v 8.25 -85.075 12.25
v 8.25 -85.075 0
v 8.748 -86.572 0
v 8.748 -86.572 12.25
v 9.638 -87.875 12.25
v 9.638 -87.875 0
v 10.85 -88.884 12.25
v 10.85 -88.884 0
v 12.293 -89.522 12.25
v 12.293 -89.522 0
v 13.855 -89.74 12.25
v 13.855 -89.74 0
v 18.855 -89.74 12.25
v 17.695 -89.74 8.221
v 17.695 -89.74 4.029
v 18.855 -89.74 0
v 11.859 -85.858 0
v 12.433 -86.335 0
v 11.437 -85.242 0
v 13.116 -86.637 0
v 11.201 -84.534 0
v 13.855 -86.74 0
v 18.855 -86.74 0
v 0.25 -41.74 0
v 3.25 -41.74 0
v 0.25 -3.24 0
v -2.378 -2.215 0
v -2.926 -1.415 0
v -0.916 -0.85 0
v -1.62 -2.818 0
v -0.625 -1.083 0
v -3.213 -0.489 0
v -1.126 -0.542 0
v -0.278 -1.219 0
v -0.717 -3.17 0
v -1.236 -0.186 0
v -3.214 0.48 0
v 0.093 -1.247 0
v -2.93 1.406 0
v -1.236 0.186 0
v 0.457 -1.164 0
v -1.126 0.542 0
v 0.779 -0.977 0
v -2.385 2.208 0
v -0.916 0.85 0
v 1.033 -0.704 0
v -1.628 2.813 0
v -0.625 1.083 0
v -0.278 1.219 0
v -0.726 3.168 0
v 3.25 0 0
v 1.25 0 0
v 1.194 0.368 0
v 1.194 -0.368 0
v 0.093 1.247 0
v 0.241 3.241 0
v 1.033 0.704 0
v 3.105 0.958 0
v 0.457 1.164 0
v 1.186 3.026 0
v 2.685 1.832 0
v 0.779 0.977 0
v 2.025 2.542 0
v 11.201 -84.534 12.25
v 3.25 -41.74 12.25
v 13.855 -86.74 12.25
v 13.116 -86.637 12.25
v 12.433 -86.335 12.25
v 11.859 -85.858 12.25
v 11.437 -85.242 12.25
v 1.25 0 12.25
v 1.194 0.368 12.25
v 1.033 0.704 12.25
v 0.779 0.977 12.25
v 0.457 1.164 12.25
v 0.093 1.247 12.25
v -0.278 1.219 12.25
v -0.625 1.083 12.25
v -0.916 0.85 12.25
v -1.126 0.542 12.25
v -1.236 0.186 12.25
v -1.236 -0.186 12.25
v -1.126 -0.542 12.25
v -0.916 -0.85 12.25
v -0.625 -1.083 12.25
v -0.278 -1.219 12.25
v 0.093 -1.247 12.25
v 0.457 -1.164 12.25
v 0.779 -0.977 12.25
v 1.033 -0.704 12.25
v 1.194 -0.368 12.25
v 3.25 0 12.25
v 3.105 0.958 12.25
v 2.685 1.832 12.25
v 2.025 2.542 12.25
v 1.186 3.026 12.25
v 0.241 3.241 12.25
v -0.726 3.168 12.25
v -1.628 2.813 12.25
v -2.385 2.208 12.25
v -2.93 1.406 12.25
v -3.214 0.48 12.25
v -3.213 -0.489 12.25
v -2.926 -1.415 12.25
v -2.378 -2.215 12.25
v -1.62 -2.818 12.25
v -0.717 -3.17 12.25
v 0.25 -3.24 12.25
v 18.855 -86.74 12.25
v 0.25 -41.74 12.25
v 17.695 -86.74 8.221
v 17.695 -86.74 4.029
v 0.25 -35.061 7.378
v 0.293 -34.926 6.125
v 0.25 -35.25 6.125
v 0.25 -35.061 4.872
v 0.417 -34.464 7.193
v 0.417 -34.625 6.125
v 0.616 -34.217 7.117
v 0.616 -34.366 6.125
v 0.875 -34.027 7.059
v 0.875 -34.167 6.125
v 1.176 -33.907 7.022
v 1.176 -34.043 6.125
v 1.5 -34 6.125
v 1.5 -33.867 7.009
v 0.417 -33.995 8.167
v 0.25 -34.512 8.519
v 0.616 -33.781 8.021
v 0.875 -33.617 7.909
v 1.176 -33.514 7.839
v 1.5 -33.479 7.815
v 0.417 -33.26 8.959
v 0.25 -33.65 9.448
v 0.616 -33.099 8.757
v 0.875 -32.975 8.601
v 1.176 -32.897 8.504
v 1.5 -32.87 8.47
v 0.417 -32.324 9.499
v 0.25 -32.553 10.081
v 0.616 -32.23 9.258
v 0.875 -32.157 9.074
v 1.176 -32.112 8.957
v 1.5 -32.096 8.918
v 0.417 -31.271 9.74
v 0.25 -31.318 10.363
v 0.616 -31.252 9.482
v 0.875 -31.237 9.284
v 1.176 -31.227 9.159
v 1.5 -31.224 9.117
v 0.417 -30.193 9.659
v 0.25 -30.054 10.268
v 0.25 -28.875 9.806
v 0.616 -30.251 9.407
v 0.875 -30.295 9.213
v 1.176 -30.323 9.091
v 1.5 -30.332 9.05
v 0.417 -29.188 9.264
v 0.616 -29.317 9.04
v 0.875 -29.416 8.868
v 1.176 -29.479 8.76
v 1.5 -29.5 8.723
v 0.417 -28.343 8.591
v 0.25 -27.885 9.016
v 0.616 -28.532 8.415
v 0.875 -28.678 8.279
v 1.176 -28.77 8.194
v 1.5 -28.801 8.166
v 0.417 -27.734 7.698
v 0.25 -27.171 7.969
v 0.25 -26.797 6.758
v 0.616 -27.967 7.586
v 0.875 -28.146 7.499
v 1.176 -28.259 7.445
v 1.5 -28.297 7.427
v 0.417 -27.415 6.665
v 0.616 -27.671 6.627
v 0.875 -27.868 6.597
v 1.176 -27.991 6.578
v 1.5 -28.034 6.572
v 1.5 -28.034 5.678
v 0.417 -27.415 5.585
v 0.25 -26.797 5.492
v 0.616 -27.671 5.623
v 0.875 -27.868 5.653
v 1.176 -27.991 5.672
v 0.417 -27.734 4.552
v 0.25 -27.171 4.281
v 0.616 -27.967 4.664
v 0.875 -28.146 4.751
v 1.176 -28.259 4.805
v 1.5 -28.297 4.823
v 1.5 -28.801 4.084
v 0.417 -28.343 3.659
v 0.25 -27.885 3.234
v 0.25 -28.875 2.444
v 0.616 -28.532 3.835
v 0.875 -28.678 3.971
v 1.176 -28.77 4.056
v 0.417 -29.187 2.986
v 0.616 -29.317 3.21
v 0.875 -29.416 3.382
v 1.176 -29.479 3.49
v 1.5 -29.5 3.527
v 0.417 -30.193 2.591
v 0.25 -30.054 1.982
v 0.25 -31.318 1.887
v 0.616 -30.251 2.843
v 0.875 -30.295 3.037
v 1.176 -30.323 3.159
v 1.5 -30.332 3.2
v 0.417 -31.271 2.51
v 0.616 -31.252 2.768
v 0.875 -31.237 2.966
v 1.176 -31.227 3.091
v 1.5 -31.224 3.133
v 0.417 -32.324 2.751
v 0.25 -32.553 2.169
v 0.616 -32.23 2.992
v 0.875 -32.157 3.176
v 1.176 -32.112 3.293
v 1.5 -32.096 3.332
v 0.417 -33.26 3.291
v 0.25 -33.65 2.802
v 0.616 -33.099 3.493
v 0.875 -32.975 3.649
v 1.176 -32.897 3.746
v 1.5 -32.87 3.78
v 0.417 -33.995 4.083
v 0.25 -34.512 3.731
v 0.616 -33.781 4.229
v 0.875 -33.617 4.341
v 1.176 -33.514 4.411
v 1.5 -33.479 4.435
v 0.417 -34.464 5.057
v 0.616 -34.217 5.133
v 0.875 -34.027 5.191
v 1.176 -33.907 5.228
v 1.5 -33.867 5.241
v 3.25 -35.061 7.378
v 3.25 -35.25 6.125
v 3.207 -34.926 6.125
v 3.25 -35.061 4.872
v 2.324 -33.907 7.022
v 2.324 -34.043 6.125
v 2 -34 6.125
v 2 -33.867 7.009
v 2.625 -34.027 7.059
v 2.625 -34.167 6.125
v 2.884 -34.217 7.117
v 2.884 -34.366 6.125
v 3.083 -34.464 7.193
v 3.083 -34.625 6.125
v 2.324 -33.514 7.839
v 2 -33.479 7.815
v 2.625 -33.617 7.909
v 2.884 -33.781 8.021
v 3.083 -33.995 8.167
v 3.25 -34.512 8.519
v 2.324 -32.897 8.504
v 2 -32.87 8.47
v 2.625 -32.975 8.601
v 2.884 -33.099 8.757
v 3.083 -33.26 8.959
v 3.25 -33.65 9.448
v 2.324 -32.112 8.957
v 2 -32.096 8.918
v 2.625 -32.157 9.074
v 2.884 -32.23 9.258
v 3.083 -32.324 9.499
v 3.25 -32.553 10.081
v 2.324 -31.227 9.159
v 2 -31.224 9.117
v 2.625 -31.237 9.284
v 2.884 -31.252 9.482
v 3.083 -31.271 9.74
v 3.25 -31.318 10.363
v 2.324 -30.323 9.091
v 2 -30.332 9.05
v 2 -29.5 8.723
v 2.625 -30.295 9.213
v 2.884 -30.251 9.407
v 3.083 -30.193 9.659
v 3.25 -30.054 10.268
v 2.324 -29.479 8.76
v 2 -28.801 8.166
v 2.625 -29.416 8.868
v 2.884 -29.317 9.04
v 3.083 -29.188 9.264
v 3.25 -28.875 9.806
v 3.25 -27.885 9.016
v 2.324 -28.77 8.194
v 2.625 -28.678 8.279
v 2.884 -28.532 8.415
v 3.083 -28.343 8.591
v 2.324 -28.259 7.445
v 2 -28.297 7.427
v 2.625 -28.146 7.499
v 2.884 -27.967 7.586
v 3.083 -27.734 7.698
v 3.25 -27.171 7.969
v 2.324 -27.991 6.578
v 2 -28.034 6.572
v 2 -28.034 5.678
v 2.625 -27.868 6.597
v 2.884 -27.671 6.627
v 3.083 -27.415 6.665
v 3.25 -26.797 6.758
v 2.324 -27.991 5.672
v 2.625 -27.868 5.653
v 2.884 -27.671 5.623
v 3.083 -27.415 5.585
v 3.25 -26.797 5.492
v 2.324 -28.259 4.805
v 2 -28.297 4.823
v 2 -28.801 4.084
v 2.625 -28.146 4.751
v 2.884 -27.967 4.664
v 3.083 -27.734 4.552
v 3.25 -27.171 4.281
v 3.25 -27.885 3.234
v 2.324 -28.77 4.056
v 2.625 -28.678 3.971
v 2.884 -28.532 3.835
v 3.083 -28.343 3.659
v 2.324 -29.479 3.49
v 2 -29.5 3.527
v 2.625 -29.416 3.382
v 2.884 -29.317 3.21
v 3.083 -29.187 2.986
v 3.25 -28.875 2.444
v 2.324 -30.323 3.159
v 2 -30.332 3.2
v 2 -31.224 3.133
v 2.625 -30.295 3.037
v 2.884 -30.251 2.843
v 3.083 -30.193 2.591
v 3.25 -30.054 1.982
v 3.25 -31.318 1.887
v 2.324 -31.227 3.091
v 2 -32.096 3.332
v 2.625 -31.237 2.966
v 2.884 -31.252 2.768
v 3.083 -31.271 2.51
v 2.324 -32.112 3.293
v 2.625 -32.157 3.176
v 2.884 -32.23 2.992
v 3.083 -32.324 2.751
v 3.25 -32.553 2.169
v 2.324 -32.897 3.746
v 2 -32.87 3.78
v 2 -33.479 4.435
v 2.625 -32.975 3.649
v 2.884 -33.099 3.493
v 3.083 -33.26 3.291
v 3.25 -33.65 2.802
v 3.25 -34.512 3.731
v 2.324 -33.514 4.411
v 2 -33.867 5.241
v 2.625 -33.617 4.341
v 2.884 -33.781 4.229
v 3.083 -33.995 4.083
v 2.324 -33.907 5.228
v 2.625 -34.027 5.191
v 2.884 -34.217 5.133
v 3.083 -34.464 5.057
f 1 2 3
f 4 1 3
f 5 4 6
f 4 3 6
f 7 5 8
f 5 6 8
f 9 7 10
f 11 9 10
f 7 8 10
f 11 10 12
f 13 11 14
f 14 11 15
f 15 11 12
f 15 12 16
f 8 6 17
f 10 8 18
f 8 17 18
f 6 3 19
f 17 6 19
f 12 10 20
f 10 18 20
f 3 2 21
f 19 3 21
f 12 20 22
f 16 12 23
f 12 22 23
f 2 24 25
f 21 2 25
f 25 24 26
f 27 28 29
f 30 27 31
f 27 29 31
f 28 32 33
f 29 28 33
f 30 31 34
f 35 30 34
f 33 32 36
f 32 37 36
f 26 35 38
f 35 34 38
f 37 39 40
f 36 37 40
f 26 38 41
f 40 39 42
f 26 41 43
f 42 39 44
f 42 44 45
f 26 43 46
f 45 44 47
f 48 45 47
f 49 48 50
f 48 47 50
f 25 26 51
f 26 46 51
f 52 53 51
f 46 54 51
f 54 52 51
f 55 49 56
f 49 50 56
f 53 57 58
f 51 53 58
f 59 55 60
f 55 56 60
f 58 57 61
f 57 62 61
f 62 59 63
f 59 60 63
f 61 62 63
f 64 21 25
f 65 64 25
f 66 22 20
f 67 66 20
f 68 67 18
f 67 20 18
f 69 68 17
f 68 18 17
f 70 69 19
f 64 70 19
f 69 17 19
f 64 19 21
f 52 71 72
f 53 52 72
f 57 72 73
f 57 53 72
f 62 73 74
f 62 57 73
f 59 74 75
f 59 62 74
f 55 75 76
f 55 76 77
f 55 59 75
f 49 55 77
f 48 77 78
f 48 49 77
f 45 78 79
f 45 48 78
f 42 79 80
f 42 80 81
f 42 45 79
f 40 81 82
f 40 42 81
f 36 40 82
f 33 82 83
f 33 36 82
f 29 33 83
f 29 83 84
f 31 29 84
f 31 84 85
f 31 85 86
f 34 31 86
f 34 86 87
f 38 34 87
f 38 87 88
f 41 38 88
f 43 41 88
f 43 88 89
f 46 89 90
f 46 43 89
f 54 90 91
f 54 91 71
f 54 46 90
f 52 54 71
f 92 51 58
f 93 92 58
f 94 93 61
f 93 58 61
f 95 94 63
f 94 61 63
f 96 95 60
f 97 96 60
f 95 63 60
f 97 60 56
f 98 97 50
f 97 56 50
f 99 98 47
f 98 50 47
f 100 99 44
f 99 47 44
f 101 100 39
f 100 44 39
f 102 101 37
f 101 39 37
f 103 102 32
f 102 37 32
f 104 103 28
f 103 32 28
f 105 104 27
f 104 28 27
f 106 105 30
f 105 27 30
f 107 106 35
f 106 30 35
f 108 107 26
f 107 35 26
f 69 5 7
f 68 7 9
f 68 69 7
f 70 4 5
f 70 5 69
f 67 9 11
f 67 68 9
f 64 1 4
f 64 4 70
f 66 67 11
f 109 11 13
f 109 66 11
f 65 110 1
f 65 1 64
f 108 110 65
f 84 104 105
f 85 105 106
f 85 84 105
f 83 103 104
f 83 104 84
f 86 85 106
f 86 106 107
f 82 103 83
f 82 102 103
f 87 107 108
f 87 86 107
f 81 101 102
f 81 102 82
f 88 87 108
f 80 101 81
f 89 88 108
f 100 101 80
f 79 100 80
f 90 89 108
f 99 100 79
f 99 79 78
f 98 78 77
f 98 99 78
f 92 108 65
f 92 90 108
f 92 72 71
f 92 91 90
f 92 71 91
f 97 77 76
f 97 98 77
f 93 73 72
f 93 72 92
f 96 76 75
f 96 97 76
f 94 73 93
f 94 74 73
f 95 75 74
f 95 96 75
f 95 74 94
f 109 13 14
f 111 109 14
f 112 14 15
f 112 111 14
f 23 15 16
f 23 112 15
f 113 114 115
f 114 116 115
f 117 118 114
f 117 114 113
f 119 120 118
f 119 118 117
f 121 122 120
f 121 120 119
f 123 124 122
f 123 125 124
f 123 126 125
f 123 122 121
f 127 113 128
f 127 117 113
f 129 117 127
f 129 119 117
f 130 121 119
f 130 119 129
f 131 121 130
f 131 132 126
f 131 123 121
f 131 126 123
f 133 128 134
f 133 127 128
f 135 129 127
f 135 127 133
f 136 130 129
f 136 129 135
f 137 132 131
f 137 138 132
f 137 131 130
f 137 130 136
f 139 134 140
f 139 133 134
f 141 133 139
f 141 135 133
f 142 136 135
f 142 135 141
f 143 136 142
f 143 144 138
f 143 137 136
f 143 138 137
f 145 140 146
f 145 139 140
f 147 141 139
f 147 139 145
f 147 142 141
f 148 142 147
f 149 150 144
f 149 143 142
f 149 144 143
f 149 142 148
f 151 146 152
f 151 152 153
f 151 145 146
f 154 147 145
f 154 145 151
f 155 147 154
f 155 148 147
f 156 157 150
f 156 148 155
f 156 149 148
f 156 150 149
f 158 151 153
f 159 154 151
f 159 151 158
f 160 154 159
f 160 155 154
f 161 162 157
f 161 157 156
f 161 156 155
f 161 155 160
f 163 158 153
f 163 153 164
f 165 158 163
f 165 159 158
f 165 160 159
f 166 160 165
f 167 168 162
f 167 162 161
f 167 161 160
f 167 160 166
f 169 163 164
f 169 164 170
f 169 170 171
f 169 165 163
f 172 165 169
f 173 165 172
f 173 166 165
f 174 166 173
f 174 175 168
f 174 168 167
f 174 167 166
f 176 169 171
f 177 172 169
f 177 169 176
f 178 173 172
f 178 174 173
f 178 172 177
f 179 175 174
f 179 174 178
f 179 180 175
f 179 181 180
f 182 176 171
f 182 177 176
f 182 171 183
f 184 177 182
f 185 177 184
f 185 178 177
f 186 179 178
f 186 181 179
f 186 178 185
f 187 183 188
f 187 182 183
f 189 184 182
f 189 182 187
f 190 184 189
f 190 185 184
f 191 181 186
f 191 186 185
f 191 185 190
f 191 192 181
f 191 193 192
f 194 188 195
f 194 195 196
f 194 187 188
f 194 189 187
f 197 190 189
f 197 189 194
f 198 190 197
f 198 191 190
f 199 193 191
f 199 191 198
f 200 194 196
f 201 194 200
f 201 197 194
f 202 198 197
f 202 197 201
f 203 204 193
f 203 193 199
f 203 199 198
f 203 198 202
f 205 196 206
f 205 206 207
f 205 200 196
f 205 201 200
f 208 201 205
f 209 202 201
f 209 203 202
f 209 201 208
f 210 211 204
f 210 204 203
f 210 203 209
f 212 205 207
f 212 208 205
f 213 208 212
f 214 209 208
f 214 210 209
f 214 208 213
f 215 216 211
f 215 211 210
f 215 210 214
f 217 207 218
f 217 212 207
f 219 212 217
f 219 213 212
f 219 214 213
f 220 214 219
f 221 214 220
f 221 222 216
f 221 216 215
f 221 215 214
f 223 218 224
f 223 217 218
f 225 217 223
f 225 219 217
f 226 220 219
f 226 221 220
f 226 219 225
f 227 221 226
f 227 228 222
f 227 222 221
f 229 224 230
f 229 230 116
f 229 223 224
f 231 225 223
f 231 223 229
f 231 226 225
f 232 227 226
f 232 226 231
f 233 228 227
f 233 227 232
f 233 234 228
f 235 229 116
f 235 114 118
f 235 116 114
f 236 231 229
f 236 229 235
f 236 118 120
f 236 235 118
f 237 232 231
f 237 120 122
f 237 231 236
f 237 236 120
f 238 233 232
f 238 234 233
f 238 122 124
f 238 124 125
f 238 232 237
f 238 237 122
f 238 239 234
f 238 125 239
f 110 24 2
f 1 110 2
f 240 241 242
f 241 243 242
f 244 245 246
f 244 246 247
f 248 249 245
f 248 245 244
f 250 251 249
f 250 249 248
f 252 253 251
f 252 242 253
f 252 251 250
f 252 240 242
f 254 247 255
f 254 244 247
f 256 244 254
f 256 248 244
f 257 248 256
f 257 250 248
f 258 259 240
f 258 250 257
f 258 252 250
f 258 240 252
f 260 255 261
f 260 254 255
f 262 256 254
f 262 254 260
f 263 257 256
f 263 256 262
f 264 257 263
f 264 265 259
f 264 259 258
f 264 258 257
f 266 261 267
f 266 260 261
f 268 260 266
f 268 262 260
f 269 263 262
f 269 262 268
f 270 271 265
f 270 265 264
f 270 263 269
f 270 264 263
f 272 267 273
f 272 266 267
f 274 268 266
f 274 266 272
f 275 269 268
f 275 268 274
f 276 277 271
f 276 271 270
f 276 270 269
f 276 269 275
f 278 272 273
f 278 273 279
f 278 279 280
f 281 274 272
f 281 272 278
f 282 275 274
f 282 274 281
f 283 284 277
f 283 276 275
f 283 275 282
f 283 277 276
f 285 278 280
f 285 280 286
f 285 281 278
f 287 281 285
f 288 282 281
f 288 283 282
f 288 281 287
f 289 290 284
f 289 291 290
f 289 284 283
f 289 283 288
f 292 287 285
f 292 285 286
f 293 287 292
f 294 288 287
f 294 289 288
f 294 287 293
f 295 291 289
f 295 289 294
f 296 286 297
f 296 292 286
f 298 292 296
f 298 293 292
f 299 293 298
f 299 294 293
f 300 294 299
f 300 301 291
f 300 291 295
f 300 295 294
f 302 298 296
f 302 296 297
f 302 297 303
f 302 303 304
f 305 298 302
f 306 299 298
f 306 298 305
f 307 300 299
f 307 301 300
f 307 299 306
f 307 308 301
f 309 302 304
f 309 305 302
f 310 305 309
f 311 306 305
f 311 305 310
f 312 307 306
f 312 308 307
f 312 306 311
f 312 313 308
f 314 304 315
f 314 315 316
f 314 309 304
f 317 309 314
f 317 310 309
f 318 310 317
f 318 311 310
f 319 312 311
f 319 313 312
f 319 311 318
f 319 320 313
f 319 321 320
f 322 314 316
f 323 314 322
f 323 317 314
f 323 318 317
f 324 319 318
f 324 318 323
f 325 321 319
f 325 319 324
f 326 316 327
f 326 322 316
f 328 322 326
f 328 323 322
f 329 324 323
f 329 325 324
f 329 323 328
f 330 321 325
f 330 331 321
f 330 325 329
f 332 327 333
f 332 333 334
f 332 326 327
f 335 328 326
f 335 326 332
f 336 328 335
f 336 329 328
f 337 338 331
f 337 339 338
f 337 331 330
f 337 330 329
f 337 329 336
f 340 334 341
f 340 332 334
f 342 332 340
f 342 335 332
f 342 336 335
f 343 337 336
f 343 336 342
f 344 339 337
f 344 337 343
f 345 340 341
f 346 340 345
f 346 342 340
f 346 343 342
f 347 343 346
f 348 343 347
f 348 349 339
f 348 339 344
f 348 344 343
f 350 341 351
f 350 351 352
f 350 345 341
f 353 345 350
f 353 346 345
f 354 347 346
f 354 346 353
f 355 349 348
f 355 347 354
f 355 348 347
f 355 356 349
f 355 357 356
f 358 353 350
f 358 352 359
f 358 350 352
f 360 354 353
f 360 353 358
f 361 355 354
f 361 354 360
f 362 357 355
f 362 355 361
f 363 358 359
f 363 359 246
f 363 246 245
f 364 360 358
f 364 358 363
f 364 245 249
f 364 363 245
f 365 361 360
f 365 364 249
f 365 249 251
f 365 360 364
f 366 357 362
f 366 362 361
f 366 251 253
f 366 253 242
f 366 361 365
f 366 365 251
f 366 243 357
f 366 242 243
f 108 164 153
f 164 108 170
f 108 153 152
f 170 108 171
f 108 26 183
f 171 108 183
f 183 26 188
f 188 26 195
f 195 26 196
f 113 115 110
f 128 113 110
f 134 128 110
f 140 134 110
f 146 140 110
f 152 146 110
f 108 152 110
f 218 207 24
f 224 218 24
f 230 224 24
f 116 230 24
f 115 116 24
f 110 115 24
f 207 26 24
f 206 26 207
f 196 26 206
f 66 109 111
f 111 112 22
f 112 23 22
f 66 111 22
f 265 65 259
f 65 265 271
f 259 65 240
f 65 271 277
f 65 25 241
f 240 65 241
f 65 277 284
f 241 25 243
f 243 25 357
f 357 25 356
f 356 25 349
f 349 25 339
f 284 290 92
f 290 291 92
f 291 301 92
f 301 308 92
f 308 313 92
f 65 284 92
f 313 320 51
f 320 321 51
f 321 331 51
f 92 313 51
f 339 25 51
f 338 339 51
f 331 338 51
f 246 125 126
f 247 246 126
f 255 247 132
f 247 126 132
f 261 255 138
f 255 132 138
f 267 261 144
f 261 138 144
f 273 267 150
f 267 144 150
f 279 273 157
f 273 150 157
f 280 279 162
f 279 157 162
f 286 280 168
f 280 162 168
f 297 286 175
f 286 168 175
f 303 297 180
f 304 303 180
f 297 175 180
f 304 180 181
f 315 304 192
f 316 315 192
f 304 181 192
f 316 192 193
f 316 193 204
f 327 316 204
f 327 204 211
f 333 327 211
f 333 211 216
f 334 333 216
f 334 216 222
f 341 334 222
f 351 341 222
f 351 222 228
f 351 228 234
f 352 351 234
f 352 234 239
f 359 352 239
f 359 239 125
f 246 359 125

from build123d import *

# Parameters (mm, degrees)
SKETCH1_R           = 1.25
BOSS_EXTRUDE1_DEPTH = 12.25
CUT_EXTRUDE1_REACH  = 94.464
SKETCH2_R           = 3
FILLET1_R           = 1.25
CUT_EXTRUDE2_REACH  = 94.757


with BuildPart() as part:
    # Sketch1 → Boss-Extrude1 (new body)
    with BuildSketch(Plane.XY):
        with BuildLine():
            Line((0.25, -3.240370349), (0.25, -41.740370349))
            Line((0.25, -41.740370349), (8.25, -85.075157412))
            ThreePointArc((8.25, -85.075157412), (10.208936196, -88.421482437), (13.855284626, -89.740370349))
            Line((13.855284626, -89.740370349), (18.855284626, -89.740370349))
            Line((18.855284626, -89.740370349), (18.855284626, -86.740370349))
            Line((18.855284626, -86.740370349), (13.855284626, -86.740370349))
            ThreePointArc((13.855284626, -86.740370349), (12.129255683, -86.116622764), (11.200712952, -84.533573379))
            Line((11.200712952, -84.533573379), (3.25, -41.740370349))
            Line((3.25, -41.740370349), (3.25, 0))
            ThreePointArc((3.25, 0), (-2.384848004, 2.207940217), (0.25, -3.240370349))
        make_face()
        Circle(SKETCH1_R, mode=Mode.SUBTRACT)
    extrude(amount=BOSS_EXTRUDE1_DEPTH)

    # Sketch2 → Cut-Extrude1 (cut, up to next)
    with BuildSketch(Plane.ZY.offset(-0.25), mode=Mode.PRIVATE) as cut_extrude1_sk1:
        with Locations(Location((6.125, -31, 0), (0, 0, 270))):
            Circle(SKETCH2_R)
    cut_extrude1_tool1 = extrude(cut_extrude1_sk1.sketch, amount=-CUT_EXTRUDE1_REACH, mode=Mode.PRIVATE) & part.part
    add(cut_extrude1_tool1.solids().sort_by_distance((0.25, -31, 6.125))[0], mode=Mode.SUBTRACT)

    # Fillet1
    fillet1_edges = [part.edges().sort_by_distance(p)[0] for p in [
        (0.25, -28, 6.125),
        (3.25, -28, 6.125),
    ]]
    fillet(fillet1_edges, radius=FILLET1_R)

    # Sketch4 → Cut-Extrude2 (cut, up to next)
    with BuildSketch(Plane(origin=(0, -86.740370349, 0), x_dir=(1, 0, 0), z_dir=(0, 1, 0)), mode=Mode.PRIVATE) as cut_extrude2_sk1:
        with BuildLine():
            Line((18.855284626, 0), (18.855284626, -12.25))
            ThreePointArc((18.855284626, -12.25), (17.547778007, -6.125), (18.855284626, 0))
        make_face()
    cut_extrude2_tool1 = extrude(cut_extrude2_sk1.sketch, amount=-CUT_EXTRUDE2_REACH, mode=Mode.PRIVATE) & part.part
    add(cut_extrude2_tool1.solids().sort_by_distance((18.330278, -86.74037, 6.125))[0], mode=Mode.SUBTRACT)


solid = part.part
